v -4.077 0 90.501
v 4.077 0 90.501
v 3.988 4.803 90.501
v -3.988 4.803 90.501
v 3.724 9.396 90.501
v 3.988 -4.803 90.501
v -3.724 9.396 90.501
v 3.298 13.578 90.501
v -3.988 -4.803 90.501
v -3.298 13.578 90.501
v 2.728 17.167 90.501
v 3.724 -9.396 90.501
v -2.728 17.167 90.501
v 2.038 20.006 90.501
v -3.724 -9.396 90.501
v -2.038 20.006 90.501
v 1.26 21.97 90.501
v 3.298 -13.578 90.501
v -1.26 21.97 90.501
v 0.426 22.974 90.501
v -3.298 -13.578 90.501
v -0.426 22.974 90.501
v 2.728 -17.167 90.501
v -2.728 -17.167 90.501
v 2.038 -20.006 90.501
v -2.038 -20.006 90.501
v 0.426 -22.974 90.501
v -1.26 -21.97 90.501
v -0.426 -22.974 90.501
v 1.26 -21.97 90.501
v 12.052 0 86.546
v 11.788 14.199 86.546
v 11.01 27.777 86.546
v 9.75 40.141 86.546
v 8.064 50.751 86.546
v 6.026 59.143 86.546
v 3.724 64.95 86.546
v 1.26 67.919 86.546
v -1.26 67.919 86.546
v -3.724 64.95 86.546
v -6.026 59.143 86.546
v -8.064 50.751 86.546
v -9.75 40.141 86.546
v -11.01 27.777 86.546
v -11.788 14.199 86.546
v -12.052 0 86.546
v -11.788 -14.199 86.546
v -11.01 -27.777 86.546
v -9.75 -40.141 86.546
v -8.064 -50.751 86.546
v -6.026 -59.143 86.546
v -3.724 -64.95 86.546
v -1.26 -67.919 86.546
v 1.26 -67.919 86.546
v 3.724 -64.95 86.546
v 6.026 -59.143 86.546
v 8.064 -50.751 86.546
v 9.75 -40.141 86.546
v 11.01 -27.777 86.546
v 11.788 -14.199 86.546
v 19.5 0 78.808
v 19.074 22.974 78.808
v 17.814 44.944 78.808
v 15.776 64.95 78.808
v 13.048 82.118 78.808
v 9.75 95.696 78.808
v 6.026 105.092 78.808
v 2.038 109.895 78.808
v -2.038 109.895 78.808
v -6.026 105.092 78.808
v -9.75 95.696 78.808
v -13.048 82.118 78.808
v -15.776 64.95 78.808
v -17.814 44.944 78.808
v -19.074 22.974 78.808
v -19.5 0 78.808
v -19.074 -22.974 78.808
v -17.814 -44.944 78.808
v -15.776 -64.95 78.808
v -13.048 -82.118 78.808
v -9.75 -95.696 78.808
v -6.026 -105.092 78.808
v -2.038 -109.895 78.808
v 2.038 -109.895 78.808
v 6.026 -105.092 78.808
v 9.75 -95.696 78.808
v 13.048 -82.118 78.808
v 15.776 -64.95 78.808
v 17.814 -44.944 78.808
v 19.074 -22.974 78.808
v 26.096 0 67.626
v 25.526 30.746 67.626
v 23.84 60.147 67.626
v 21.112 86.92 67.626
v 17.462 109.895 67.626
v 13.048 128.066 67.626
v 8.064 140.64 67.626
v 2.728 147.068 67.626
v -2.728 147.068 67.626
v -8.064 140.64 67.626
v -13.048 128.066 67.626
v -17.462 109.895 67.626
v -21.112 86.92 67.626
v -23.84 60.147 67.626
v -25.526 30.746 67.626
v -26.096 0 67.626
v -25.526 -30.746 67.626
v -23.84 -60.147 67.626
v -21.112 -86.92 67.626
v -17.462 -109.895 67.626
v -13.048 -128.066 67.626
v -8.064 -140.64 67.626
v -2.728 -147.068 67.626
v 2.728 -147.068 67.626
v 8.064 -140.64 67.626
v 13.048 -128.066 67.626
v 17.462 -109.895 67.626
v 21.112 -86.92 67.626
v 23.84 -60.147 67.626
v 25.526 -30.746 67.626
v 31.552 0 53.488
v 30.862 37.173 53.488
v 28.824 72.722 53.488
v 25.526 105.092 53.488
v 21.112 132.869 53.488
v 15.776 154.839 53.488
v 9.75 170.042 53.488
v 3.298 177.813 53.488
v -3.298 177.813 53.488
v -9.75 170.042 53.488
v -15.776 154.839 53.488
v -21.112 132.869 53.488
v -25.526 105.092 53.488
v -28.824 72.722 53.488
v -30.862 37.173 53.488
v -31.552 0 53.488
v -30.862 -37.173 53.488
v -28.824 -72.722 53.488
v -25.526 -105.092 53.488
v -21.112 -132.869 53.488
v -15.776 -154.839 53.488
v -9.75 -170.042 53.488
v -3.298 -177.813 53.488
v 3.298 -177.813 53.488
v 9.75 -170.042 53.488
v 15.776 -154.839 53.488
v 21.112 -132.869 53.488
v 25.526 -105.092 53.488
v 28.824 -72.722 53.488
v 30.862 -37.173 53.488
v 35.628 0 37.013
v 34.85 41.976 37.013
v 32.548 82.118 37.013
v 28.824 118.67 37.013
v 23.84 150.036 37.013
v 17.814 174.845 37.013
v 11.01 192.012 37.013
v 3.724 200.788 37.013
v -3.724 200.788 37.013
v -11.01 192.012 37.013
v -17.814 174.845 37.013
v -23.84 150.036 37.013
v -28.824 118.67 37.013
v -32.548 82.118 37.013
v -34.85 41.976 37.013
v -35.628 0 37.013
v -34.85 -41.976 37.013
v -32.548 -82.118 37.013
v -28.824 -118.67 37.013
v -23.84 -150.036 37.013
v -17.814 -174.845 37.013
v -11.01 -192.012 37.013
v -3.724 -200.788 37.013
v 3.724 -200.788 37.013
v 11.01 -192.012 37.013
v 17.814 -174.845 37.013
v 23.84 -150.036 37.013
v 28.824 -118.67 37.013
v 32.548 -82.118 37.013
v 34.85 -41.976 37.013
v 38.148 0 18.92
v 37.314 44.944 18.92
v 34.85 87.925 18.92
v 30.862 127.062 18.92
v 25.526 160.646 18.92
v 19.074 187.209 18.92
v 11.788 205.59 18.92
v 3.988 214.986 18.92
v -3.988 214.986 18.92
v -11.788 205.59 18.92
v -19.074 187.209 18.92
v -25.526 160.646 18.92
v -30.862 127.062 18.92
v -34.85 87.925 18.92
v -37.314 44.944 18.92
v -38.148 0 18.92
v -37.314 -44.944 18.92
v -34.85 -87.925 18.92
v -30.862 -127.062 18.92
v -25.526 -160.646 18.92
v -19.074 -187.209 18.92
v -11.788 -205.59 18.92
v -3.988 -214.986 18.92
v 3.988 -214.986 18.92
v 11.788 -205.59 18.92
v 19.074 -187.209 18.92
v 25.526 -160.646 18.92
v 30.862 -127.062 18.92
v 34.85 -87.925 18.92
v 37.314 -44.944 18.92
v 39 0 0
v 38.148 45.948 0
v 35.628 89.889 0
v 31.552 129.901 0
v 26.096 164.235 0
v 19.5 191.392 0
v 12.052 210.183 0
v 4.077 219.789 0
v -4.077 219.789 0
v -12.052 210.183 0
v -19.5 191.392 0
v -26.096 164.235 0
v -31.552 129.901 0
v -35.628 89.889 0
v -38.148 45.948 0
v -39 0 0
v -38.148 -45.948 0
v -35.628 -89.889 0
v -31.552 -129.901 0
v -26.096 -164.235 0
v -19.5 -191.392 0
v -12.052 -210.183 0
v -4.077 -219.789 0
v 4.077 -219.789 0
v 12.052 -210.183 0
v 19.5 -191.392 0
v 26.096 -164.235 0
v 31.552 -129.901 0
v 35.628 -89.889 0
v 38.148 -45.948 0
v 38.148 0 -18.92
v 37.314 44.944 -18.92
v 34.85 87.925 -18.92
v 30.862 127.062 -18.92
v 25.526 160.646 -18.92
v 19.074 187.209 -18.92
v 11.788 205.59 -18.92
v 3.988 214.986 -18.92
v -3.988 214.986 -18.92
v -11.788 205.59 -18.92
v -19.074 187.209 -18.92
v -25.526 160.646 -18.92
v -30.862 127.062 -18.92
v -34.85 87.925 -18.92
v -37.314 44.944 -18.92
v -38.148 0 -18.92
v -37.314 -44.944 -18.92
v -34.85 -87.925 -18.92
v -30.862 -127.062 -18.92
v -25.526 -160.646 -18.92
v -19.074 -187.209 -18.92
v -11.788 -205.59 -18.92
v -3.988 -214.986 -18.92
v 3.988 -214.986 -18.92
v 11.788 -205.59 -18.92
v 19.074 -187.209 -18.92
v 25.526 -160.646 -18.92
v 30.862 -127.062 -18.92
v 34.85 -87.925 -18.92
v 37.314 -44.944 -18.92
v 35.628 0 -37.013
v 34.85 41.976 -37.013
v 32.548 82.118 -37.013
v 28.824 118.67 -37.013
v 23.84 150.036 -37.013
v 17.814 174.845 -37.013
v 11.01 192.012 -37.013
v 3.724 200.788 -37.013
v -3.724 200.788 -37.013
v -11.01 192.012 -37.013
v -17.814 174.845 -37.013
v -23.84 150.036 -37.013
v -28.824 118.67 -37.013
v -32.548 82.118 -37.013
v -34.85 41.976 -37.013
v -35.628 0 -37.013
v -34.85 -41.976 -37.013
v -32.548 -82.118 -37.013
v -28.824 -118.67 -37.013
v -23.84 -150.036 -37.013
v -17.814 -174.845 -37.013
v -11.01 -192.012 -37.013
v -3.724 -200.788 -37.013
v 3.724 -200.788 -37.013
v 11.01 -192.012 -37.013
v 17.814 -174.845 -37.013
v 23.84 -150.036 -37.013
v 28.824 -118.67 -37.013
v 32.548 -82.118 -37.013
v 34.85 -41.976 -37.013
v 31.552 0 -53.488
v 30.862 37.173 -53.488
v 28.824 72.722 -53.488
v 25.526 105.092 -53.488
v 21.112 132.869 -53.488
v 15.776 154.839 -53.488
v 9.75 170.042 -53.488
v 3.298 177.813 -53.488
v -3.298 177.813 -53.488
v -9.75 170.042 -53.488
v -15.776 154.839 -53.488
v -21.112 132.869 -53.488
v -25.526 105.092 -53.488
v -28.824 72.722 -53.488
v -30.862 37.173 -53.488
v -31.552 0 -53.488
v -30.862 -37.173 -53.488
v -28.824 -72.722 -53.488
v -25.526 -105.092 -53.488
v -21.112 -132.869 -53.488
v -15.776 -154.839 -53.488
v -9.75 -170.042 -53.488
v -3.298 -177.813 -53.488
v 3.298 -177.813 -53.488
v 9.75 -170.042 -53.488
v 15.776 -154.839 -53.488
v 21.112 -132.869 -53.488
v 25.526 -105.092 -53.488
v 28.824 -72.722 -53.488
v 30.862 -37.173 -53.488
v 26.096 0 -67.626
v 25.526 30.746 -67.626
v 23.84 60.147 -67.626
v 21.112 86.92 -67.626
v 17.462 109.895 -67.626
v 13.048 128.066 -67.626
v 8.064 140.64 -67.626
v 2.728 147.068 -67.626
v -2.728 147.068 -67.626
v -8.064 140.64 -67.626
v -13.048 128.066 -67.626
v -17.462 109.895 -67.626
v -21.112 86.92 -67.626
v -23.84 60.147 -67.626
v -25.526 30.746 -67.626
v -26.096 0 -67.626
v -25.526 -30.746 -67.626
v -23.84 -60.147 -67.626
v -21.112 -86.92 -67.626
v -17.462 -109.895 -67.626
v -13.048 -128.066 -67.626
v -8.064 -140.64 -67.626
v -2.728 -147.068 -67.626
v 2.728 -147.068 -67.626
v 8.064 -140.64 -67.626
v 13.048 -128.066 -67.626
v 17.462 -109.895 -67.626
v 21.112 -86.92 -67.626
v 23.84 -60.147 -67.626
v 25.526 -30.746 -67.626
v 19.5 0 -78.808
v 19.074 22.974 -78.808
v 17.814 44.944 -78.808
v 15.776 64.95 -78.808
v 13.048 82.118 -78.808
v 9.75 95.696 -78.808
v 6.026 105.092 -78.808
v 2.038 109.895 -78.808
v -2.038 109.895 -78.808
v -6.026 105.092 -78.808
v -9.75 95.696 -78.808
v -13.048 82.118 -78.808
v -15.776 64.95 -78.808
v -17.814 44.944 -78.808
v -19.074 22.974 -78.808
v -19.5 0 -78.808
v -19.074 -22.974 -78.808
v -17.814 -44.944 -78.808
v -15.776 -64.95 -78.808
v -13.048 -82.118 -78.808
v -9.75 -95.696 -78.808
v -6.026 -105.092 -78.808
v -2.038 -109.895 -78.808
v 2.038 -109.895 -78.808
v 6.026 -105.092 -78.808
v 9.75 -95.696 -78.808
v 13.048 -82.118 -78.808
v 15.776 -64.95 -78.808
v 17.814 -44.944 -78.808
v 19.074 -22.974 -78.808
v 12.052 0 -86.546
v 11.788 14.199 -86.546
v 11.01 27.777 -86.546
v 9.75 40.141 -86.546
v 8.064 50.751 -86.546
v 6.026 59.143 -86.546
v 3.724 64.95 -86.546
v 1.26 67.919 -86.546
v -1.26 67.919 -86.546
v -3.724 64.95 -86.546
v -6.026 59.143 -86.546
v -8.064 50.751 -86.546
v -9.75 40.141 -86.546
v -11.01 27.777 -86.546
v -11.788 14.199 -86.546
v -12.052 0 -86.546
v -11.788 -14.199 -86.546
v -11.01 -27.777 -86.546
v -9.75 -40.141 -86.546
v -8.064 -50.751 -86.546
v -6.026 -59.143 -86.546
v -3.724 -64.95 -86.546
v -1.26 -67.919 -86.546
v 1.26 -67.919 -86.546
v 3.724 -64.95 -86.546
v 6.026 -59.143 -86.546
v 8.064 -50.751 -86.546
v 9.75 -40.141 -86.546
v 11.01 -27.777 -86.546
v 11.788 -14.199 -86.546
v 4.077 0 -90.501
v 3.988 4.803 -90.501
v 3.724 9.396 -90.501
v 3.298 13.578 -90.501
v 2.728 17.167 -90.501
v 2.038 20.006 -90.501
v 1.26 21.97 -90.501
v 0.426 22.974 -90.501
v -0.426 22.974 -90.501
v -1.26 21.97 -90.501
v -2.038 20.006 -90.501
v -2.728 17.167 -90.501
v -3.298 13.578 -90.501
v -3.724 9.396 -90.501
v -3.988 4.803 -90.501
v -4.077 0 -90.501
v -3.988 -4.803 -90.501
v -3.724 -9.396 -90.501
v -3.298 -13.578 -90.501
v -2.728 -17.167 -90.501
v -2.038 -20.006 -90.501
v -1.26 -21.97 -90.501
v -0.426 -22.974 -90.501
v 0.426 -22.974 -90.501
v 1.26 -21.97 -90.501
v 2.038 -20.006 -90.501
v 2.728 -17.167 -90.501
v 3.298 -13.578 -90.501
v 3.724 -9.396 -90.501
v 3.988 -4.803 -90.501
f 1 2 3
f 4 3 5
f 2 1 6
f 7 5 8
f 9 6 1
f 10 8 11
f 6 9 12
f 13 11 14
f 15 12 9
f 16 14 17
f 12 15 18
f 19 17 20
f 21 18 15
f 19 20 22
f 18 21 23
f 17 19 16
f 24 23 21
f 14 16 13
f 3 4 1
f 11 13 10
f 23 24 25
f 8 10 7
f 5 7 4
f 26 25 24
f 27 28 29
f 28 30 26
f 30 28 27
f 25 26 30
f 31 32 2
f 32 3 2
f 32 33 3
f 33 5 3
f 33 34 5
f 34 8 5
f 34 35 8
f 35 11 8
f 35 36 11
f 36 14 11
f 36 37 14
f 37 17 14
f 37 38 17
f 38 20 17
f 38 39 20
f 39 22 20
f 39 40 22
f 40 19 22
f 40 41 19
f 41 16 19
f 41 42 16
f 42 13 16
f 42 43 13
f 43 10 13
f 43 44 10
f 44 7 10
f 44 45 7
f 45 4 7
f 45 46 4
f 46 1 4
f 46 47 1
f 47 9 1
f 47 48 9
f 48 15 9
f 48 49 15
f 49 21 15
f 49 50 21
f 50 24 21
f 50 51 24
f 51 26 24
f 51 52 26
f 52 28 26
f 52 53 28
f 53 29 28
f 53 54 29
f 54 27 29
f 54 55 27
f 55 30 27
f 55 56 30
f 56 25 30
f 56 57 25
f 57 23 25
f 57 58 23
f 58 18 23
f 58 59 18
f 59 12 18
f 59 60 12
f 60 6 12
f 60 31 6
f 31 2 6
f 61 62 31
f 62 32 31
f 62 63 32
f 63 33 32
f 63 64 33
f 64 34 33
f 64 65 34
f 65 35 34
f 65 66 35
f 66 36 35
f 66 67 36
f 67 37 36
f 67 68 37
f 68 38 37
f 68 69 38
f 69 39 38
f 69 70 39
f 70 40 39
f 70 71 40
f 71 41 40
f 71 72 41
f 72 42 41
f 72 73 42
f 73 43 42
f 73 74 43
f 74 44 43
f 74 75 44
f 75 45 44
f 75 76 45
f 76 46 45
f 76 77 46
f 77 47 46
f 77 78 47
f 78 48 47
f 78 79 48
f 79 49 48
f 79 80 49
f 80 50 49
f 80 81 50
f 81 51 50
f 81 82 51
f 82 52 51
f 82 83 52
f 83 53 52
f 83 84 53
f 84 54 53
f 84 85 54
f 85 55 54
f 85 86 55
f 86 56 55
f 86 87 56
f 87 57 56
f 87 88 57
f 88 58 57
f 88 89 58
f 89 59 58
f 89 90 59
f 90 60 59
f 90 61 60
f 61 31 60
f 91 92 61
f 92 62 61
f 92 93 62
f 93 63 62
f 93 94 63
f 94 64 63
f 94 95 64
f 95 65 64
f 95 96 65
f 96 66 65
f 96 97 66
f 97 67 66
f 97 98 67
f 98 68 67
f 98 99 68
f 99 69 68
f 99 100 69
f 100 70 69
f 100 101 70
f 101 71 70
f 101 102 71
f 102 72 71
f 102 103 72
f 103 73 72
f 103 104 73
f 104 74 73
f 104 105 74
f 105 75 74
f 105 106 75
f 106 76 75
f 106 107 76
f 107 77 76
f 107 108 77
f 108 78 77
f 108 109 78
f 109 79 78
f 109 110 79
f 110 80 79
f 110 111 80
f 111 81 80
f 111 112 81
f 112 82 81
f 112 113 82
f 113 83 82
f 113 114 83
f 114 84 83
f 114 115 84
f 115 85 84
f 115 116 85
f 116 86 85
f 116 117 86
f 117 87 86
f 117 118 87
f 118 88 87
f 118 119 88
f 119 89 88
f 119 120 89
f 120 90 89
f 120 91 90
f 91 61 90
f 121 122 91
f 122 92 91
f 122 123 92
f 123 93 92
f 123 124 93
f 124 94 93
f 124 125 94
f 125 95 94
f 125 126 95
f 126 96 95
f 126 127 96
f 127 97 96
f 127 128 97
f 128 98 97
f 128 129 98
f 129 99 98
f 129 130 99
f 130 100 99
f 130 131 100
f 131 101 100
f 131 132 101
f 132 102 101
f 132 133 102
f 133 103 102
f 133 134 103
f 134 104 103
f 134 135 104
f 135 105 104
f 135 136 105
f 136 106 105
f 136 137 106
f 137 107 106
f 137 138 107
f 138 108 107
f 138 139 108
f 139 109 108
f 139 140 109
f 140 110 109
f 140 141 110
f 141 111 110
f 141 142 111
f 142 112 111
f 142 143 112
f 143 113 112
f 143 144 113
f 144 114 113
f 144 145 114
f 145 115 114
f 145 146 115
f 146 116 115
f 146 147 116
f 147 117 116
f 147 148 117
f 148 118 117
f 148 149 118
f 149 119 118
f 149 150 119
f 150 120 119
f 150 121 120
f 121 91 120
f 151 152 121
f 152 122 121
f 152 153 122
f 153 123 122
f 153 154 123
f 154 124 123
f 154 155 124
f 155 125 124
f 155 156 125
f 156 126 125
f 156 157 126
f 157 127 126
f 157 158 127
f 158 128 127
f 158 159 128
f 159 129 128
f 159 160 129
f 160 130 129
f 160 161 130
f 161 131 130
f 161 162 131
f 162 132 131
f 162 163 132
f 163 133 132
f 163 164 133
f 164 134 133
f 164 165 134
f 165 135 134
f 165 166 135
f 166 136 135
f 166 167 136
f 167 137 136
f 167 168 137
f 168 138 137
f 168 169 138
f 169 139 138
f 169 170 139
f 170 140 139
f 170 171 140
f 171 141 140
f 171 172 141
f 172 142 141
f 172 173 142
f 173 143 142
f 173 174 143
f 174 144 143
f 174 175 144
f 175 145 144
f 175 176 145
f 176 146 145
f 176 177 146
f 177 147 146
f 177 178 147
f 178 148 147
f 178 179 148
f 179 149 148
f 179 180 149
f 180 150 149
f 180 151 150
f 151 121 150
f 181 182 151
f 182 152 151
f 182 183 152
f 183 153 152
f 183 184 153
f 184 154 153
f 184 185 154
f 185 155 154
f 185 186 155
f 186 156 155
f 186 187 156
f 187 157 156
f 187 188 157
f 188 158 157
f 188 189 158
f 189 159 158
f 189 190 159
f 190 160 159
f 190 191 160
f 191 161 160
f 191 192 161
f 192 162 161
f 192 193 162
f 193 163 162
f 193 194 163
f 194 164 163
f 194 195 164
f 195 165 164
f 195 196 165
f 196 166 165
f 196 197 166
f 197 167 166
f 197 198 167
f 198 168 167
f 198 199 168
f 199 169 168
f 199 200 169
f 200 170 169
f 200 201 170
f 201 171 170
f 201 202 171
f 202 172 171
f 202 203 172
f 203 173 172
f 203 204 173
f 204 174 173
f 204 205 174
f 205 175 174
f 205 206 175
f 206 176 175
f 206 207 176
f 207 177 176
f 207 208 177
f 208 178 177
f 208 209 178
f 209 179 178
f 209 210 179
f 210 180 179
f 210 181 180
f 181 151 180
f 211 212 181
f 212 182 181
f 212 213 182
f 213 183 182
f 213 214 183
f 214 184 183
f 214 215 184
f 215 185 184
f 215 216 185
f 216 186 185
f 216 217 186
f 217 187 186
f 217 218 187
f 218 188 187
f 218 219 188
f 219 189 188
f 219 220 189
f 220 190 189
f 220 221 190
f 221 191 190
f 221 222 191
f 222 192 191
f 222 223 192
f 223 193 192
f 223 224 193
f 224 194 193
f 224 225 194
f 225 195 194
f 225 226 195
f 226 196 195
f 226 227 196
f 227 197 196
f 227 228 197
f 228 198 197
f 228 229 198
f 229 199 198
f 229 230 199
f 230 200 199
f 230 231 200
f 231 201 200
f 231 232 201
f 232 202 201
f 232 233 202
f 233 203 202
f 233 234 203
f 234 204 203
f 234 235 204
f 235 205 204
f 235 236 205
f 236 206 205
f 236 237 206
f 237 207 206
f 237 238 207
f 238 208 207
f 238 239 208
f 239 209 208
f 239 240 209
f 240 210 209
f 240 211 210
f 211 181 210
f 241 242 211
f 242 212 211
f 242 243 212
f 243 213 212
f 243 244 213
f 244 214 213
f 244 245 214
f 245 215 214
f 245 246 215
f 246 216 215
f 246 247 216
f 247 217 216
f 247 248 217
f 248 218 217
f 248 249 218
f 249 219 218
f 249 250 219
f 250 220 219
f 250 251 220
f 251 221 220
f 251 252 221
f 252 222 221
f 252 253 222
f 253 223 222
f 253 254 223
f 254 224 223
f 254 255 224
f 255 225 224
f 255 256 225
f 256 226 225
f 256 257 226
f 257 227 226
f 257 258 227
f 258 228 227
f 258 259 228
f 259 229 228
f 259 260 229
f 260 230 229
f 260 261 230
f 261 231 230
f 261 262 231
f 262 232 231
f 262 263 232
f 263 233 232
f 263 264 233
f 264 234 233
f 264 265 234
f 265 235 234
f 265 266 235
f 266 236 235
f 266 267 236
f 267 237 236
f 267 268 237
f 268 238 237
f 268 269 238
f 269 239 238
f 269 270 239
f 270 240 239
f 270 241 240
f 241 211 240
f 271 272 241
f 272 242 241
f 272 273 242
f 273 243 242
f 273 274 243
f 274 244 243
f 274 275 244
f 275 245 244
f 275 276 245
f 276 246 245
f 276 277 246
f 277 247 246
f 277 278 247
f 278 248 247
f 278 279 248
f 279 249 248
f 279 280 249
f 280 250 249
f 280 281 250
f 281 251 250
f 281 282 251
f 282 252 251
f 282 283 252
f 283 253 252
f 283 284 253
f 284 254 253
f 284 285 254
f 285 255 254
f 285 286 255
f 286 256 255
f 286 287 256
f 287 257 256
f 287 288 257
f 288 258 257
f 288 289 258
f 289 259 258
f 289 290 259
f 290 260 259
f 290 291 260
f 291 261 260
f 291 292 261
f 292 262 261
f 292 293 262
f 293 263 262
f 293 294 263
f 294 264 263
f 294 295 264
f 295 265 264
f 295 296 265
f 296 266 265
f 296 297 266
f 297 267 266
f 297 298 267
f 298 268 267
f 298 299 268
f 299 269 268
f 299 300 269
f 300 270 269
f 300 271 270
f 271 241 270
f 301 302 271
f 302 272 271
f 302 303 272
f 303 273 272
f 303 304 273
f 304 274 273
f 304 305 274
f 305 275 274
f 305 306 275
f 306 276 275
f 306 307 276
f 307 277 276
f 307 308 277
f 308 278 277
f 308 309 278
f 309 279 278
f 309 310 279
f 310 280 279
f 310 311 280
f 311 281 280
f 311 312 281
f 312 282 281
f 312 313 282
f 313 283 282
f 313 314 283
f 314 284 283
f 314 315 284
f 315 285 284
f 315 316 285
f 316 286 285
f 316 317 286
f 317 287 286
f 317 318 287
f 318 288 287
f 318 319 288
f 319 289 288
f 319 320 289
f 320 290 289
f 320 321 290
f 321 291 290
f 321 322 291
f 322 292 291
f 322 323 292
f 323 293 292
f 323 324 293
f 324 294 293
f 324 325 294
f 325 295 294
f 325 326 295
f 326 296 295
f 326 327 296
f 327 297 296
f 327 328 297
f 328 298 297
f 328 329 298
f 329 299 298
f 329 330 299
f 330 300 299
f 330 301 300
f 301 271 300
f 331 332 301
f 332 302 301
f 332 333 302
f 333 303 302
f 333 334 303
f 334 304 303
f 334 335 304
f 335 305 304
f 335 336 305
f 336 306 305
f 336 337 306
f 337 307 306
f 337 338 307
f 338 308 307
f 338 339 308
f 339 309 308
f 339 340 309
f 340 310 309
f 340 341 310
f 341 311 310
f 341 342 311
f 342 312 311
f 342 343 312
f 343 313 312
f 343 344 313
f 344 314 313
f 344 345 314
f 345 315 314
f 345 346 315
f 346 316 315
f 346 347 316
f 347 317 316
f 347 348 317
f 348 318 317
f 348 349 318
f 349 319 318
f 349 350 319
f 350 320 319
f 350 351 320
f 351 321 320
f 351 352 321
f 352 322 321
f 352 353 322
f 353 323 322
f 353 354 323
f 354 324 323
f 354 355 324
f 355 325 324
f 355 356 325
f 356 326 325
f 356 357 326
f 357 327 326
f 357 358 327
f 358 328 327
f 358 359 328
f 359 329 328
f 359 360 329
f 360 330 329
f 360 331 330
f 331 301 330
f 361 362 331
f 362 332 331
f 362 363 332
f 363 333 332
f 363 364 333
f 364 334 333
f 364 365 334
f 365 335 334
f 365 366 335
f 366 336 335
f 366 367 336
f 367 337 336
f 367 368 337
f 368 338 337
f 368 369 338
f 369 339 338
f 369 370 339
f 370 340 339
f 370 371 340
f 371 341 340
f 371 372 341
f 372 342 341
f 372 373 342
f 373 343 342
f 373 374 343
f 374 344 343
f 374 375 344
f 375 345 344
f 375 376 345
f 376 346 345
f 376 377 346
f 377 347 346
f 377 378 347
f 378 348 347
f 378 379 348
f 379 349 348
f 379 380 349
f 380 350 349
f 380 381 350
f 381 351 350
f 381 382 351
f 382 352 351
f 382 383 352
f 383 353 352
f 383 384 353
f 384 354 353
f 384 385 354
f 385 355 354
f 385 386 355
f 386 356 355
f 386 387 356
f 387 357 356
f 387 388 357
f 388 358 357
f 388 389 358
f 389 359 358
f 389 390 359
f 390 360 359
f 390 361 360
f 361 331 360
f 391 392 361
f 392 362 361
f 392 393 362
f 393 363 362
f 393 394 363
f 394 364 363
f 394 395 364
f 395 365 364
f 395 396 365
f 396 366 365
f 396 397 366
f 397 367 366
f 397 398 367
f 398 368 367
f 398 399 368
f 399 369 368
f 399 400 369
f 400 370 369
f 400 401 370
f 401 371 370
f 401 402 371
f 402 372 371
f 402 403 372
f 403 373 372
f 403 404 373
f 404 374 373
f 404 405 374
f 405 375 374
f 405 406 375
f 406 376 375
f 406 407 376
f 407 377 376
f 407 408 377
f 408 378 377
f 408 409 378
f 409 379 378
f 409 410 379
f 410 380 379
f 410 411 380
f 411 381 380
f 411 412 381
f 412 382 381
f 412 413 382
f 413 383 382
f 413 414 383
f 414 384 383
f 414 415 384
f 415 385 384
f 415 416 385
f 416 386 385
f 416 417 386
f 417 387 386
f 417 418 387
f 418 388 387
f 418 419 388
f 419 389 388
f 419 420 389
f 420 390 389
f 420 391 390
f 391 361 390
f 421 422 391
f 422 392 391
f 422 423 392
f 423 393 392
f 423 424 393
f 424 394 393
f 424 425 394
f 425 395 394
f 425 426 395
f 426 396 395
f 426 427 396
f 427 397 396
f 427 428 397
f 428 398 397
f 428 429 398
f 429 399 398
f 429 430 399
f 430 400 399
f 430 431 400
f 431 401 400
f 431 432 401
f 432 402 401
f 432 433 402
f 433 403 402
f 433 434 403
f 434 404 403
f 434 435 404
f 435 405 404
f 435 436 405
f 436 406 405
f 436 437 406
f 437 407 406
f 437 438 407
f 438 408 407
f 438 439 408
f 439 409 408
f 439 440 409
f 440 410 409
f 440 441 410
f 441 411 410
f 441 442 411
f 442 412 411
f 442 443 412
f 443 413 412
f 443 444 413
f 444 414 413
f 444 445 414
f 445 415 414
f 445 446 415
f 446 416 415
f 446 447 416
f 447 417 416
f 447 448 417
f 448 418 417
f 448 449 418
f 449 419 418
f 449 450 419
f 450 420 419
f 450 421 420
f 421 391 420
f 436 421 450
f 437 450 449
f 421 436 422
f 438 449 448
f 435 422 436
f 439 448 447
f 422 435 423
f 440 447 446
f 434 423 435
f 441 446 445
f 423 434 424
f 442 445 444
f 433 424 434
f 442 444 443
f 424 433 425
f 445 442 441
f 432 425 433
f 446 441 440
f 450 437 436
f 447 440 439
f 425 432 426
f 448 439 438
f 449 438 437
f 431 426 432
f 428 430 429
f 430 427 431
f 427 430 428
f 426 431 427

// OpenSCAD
// Generated by SolidPython 1.0.1 on 2020-07-29 00:46:45


scale(v = [3, 17, 7]) {
	sphere(r = 13);
}
/***********************************************
*********      SolidPython code:      **********
************************************************
 
# import packages: SolidPython
from solid import *
from solid.utils import *
from itertools import chain, combinations, permutations


class Resize:

    def __init__(self, scad_file):
        self.scad_file = scad_file
        #self.scad_file = import_scad(scad_file)
        # cone/cylinder param:
        self.r1 = 0
        self.r2 = 0
        self.h = 0
        # rectangular prism param:
        self.w = 0
        self.l = 0
        # ellipse param:
        self.r = 0

    # import OpenScad code (file name corresponds to shape)


    # classify shape + parameters
    def assign(self, param1, param2, param3):
        if self.scad_file == 'cone.scad':
            self.r1 = param1
            self.r2 = param2
            self.h = param3
        elif self.scad_file == 'cylinder.scad':
            self.r1 = param1
            self.r2 = param2
            self.h = param3
        elif self.scad_file == 'rectangularPrism.scad':
            self.h = param1
            self.l = param2
            self.w = param3
        else:
            self.r = param1
            self.h = param2

    # resize parameters
    def iterate(self):
        x = range(3, 20, 2)
        i = 1
        if self.scad_file == 'cone.scad':
            tempList = list(permutations(x, 2))
            for temp in tempList:
                param1 = temp[0]
                param2 = temp[1]
                filepath = 'produced_scad_files/' + 'cone' + str(param1) + '_' + str(param2) + '_' + '.scad'
                scad_render_to_file(cylinder(h=param1, r1=param2, r2=0), filepath)

        elif self.scad_file == 'cylinder.scad':
            tempList = list(permutations(x, 3))
            for temp in tempList:
                param1 = temp[0]
                param2 = temp[1]
                filepath = 'produced_scad_files/' + 'cylinder' + str(param1) + '_' + str(param2) + '_' + '.scad'
                scad_render_to_file(cylinder(h=param1, r1=param2, r2=param2), filepath)

        elif self.scad_file == 'rectangularPrism.scad':
            tempList = list(permutations(x, 3))
            for temp in tempList:
                param1 = temp[0]
                param2 = temp[1]
                param3 = temp[2]
                filepath = 'produced_scad_files/' + 'rectangularPrism' + str(param1) + '_' + str(param2) + '_' + str(
                    param3) + '.scad'
                scad_render_to_file(cube(size=(param1, param2, param3)), filepath)

        elif self.scad_file == 'ellipse.scad':
            tempList = list(permutations(x, 4))
            for temp in tempList:
                param1 = temp[0]
                param2 = temp[1]
                param3 = temp[2]
                param4 = temp[3]
                filepath = 'produced_scad_files/' + 'ellipse' + str(param1) + '_' + str(param2) + '_' + str(param3) + '_' + str(param4) + '.scad'
                scad_render_to_file(scale([param1, param2, param3])(sphere(r=param4)), filepath)

    def render_to_scadfile(self):
        scad_render_to_file(scad, 'example.scad') 
 
************************************************/
